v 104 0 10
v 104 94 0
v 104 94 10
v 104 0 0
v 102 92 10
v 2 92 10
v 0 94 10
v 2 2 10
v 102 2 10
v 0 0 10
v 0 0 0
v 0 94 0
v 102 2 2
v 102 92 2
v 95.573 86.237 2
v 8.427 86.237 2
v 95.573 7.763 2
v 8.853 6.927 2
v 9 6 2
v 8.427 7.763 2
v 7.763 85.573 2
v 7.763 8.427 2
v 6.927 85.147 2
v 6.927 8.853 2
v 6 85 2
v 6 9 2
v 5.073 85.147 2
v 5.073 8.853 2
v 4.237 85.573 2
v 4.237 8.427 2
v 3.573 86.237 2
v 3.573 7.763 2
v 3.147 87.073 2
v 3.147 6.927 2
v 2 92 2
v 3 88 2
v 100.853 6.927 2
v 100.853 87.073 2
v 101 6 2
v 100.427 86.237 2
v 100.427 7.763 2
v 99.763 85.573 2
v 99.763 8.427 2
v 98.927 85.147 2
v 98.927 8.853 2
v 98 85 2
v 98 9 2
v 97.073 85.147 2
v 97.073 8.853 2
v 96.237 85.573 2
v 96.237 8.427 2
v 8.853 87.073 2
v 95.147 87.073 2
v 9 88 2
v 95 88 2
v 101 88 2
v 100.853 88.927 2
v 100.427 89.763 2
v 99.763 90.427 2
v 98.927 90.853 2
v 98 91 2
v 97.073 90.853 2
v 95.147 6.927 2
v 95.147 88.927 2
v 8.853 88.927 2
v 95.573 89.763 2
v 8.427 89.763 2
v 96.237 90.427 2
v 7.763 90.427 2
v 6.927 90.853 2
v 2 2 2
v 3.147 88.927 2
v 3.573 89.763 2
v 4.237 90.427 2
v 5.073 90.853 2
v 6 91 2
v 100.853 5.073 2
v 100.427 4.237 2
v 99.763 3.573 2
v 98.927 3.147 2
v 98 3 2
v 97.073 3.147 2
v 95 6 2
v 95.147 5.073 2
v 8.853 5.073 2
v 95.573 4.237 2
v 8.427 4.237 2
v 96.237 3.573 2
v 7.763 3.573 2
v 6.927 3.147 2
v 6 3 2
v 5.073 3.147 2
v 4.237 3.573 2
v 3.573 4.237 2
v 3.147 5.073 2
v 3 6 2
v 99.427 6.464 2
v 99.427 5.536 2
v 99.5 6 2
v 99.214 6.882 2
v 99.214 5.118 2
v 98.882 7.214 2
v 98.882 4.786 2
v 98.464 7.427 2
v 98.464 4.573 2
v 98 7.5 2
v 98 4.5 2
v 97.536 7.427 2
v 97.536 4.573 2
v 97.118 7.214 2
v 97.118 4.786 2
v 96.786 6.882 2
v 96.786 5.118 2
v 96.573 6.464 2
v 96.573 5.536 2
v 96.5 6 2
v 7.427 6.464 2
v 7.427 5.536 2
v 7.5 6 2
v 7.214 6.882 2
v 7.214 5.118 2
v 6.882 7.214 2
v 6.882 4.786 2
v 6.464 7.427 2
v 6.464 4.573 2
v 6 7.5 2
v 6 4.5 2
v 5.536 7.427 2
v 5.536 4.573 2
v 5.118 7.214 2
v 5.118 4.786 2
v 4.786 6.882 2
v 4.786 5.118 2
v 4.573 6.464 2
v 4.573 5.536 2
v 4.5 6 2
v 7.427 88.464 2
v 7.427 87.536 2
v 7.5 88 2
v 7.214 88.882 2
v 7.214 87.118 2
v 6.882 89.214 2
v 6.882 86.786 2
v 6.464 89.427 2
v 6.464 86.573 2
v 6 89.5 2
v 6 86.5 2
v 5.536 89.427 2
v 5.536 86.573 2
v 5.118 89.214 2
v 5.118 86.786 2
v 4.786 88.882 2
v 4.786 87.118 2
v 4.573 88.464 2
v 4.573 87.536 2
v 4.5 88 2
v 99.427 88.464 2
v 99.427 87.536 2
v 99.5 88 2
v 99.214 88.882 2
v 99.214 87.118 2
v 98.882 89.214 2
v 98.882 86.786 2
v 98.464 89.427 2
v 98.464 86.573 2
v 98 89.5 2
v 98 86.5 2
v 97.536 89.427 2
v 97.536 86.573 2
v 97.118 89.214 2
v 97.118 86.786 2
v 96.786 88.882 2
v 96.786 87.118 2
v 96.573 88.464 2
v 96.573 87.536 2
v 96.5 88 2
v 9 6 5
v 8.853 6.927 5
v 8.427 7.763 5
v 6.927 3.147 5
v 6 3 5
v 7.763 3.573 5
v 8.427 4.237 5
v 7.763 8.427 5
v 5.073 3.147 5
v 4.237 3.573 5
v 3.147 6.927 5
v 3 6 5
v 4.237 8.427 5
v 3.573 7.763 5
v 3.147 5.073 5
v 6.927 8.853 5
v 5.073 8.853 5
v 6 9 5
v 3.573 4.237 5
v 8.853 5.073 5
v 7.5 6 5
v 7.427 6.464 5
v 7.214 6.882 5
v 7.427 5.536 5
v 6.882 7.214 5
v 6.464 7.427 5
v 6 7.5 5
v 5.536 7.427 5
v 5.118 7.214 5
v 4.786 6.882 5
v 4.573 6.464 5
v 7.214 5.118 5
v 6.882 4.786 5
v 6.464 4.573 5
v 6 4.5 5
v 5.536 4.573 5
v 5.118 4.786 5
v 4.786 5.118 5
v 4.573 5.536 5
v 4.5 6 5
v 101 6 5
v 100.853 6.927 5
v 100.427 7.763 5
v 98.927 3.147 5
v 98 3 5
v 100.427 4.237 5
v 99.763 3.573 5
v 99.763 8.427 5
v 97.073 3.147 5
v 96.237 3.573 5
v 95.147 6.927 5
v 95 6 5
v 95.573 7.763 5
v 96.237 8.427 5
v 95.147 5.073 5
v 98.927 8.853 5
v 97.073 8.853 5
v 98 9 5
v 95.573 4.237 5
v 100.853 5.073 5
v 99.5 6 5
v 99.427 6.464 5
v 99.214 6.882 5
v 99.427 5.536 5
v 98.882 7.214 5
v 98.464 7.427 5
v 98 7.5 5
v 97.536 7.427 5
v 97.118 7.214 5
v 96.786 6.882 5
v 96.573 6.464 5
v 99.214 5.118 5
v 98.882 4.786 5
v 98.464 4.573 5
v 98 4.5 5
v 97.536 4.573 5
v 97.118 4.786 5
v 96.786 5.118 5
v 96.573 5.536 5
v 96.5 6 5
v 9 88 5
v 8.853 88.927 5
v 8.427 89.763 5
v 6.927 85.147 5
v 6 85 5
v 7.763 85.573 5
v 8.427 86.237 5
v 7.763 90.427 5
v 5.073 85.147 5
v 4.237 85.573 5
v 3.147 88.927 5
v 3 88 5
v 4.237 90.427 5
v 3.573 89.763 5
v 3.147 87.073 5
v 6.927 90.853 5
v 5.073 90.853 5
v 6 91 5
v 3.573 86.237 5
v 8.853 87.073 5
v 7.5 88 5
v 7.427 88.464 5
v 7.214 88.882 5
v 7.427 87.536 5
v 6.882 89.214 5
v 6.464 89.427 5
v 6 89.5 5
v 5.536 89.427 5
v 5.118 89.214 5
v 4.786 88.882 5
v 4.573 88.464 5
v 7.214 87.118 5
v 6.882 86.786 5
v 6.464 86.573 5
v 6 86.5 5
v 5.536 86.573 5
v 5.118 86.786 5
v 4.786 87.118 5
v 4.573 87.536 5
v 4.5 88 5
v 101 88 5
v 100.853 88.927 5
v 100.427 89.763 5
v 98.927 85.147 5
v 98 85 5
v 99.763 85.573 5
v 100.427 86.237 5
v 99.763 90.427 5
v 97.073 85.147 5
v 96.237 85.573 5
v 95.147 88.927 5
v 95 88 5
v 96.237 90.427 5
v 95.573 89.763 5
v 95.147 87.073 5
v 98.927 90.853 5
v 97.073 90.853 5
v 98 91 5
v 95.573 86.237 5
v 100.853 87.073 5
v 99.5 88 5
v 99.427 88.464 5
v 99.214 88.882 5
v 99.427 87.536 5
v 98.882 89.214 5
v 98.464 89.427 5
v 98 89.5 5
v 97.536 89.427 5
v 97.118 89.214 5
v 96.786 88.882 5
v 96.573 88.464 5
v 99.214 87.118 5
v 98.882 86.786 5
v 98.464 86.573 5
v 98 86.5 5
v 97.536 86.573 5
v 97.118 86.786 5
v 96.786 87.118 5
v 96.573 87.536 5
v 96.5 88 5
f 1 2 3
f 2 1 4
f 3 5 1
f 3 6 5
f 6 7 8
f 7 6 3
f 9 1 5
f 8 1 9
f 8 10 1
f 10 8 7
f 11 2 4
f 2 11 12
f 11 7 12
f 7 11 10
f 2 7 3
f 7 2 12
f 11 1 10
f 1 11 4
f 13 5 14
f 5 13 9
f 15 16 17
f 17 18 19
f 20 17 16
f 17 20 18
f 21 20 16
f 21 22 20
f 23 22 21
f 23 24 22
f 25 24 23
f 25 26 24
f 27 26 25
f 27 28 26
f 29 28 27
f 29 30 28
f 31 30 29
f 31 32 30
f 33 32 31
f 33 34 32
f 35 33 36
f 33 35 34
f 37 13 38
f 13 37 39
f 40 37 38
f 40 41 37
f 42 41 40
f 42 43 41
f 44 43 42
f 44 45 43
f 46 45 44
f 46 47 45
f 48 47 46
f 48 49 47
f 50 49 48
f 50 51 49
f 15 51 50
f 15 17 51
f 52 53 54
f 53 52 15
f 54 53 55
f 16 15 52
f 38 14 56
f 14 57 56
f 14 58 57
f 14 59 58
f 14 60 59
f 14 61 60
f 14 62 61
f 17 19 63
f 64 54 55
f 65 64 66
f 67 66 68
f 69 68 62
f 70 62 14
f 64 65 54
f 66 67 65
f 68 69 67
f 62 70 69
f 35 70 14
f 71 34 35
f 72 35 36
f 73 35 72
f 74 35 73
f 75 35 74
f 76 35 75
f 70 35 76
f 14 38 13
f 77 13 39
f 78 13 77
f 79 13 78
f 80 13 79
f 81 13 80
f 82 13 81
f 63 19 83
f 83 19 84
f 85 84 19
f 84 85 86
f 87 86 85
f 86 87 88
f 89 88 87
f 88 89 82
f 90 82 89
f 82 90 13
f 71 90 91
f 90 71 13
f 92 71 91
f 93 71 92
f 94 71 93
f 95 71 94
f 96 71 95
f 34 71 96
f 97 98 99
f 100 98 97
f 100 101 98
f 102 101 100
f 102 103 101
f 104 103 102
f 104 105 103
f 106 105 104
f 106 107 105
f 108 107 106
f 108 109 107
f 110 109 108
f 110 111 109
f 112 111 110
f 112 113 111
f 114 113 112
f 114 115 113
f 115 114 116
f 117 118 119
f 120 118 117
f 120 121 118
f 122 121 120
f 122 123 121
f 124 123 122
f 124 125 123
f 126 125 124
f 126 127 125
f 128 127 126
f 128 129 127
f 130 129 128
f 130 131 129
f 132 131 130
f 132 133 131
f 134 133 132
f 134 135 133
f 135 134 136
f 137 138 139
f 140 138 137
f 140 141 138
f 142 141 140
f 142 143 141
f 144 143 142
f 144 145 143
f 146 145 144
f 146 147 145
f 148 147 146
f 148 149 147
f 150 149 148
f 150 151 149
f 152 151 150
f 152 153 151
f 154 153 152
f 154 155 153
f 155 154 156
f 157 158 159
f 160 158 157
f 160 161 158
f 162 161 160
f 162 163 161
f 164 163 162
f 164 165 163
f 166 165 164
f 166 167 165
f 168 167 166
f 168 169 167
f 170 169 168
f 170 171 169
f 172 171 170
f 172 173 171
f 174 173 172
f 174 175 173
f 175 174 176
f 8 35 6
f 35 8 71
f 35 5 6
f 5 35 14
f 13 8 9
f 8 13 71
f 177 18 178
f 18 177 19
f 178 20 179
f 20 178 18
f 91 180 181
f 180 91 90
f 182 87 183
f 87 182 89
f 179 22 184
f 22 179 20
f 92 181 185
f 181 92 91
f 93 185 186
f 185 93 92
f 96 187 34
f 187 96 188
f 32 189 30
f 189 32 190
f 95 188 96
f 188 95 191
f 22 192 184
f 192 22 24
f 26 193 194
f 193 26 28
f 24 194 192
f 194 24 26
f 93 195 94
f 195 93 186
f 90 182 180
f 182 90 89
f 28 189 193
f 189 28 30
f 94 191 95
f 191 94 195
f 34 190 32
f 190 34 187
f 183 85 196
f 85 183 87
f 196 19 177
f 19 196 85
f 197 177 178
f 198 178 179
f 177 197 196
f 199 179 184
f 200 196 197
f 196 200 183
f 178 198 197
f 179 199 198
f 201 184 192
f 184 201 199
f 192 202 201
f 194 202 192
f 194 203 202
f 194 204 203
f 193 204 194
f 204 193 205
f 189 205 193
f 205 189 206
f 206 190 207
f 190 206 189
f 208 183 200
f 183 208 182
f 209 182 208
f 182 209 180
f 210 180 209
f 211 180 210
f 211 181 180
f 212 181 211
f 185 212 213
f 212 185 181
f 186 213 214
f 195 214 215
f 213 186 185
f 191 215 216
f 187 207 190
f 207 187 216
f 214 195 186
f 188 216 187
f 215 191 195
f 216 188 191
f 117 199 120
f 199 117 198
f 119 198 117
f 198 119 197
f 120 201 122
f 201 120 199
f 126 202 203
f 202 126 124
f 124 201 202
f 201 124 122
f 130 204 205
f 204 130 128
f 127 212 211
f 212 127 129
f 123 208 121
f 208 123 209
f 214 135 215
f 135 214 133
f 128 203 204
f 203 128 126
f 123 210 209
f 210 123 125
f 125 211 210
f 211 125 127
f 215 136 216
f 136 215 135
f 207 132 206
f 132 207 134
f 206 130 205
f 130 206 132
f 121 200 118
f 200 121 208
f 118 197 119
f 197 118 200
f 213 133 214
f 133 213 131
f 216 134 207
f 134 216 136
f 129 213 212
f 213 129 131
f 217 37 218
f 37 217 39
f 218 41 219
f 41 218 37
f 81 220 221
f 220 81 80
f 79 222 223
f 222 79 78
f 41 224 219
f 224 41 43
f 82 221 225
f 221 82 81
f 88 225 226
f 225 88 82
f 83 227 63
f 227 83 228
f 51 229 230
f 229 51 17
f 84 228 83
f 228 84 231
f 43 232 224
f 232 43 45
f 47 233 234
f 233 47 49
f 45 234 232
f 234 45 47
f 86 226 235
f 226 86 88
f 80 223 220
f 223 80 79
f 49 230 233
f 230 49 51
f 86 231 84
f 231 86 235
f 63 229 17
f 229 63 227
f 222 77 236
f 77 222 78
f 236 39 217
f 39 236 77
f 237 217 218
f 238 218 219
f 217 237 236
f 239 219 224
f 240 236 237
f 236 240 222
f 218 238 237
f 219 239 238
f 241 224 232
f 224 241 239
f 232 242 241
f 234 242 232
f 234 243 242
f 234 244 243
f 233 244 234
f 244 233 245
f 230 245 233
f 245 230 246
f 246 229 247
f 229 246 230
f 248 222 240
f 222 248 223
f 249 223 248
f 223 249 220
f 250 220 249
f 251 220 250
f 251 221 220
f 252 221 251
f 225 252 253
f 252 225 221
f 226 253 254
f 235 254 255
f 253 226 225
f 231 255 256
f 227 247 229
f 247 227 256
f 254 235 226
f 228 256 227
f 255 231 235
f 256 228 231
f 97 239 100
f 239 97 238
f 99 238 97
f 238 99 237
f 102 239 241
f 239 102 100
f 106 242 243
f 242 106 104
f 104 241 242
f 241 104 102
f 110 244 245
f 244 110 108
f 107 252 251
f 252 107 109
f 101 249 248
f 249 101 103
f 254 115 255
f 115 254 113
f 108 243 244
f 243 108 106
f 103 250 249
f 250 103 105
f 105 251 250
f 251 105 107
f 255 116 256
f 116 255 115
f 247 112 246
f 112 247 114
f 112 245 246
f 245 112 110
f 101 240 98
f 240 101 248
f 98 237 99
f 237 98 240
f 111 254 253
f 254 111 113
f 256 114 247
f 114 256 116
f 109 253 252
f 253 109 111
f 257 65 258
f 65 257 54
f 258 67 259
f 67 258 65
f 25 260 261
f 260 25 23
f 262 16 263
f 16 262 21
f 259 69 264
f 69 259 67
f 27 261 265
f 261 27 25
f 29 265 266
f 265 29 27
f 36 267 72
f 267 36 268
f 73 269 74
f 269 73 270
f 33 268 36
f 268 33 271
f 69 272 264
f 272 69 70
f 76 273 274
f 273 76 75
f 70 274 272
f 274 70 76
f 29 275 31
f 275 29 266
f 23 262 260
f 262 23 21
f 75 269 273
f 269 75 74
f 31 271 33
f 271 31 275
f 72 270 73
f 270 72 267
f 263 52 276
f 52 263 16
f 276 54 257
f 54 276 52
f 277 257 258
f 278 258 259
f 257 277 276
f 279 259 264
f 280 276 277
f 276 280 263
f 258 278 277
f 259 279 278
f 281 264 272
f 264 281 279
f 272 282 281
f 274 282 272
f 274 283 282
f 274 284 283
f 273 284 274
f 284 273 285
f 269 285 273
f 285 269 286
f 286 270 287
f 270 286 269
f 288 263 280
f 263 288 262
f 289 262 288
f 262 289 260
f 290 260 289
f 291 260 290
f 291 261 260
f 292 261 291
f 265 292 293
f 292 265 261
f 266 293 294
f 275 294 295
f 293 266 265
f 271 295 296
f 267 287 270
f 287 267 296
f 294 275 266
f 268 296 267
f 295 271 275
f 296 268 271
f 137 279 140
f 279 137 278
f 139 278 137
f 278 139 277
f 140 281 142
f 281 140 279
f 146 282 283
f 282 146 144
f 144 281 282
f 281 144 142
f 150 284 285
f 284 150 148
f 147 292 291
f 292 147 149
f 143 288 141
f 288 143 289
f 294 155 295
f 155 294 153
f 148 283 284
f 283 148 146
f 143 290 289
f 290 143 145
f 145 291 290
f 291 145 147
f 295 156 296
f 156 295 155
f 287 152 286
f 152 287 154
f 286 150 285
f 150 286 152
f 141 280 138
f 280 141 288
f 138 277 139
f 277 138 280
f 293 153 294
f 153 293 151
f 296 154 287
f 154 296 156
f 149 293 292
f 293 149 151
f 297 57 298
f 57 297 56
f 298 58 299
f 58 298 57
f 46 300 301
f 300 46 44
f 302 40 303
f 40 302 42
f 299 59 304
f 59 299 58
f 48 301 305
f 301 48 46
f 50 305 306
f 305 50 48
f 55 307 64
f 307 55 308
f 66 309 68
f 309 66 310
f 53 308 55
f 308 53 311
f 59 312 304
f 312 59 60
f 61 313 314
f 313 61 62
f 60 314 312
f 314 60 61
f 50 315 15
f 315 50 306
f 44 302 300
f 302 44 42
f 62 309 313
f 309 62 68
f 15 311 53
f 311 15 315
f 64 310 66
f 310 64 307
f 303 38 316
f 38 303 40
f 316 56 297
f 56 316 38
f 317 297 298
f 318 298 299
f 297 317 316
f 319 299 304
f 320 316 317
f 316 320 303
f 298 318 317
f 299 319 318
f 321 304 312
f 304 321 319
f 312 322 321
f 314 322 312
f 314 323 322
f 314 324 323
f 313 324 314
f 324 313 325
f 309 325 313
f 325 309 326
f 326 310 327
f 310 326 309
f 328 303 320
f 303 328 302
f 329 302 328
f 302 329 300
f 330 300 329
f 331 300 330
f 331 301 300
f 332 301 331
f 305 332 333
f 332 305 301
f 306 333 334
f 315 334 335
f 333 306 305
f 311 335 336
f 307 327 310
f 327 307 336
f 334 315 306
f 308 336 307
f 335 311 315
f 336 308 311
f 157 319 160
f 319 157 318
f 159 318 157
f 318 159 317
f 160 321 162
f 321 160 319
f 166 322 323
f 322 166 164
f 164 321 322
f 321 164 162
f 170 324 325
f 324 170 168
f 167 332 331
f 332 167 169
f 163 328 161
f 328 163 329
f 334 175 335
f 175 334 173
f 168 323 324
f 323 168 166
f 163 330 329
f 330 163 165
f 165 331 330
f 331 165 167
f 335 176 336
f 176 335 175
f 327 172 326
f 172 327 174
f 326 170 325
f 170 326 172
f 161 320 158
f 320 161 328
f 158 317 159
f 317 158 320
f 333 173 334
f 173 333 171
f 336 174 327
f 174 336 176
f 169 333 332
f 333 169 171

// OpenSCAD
// Box Turtle Pico Shield v2 Case/Mount
// PCB Dimensions: 100mm x 90mm

pcb_width = 100;
pcb_depth = 90;
wall = 2;
standoff_height = 5;
hole_offset = 4;

module pcb_case() {
    difference() {
        // Main Shell
        cube([pcb_width + 2*wall, pcb_depth + 2*wall, 10]);
        
        // Inner Cavity
        translate([wall, wall, 2])
            cube([pcb_width, pcb_depth, 10]);
    }

    // Standoffs
    translate([wall + hole_offset, wall + hole_offset, 0]) standoff();
    translate([wall + pcb_width - hole_offset, wall + hole_offset, 0]) standoff();
    translate([wall + hole_offset, wall + pcb_depth - hole_offset, 0]) standoff();
    translate([wall + pcb_width - hole_offset, wall + pcb_depth - hole_offset, 0]) standoff();
}

module standoff() {
    difference() {
        cylinder(h=standoff_height, r=3, $fn=20);
        cylinder(h=standoff_height+1, r=1.5, $fn=20); // M3 Hole
    }
}

pcb_case();
